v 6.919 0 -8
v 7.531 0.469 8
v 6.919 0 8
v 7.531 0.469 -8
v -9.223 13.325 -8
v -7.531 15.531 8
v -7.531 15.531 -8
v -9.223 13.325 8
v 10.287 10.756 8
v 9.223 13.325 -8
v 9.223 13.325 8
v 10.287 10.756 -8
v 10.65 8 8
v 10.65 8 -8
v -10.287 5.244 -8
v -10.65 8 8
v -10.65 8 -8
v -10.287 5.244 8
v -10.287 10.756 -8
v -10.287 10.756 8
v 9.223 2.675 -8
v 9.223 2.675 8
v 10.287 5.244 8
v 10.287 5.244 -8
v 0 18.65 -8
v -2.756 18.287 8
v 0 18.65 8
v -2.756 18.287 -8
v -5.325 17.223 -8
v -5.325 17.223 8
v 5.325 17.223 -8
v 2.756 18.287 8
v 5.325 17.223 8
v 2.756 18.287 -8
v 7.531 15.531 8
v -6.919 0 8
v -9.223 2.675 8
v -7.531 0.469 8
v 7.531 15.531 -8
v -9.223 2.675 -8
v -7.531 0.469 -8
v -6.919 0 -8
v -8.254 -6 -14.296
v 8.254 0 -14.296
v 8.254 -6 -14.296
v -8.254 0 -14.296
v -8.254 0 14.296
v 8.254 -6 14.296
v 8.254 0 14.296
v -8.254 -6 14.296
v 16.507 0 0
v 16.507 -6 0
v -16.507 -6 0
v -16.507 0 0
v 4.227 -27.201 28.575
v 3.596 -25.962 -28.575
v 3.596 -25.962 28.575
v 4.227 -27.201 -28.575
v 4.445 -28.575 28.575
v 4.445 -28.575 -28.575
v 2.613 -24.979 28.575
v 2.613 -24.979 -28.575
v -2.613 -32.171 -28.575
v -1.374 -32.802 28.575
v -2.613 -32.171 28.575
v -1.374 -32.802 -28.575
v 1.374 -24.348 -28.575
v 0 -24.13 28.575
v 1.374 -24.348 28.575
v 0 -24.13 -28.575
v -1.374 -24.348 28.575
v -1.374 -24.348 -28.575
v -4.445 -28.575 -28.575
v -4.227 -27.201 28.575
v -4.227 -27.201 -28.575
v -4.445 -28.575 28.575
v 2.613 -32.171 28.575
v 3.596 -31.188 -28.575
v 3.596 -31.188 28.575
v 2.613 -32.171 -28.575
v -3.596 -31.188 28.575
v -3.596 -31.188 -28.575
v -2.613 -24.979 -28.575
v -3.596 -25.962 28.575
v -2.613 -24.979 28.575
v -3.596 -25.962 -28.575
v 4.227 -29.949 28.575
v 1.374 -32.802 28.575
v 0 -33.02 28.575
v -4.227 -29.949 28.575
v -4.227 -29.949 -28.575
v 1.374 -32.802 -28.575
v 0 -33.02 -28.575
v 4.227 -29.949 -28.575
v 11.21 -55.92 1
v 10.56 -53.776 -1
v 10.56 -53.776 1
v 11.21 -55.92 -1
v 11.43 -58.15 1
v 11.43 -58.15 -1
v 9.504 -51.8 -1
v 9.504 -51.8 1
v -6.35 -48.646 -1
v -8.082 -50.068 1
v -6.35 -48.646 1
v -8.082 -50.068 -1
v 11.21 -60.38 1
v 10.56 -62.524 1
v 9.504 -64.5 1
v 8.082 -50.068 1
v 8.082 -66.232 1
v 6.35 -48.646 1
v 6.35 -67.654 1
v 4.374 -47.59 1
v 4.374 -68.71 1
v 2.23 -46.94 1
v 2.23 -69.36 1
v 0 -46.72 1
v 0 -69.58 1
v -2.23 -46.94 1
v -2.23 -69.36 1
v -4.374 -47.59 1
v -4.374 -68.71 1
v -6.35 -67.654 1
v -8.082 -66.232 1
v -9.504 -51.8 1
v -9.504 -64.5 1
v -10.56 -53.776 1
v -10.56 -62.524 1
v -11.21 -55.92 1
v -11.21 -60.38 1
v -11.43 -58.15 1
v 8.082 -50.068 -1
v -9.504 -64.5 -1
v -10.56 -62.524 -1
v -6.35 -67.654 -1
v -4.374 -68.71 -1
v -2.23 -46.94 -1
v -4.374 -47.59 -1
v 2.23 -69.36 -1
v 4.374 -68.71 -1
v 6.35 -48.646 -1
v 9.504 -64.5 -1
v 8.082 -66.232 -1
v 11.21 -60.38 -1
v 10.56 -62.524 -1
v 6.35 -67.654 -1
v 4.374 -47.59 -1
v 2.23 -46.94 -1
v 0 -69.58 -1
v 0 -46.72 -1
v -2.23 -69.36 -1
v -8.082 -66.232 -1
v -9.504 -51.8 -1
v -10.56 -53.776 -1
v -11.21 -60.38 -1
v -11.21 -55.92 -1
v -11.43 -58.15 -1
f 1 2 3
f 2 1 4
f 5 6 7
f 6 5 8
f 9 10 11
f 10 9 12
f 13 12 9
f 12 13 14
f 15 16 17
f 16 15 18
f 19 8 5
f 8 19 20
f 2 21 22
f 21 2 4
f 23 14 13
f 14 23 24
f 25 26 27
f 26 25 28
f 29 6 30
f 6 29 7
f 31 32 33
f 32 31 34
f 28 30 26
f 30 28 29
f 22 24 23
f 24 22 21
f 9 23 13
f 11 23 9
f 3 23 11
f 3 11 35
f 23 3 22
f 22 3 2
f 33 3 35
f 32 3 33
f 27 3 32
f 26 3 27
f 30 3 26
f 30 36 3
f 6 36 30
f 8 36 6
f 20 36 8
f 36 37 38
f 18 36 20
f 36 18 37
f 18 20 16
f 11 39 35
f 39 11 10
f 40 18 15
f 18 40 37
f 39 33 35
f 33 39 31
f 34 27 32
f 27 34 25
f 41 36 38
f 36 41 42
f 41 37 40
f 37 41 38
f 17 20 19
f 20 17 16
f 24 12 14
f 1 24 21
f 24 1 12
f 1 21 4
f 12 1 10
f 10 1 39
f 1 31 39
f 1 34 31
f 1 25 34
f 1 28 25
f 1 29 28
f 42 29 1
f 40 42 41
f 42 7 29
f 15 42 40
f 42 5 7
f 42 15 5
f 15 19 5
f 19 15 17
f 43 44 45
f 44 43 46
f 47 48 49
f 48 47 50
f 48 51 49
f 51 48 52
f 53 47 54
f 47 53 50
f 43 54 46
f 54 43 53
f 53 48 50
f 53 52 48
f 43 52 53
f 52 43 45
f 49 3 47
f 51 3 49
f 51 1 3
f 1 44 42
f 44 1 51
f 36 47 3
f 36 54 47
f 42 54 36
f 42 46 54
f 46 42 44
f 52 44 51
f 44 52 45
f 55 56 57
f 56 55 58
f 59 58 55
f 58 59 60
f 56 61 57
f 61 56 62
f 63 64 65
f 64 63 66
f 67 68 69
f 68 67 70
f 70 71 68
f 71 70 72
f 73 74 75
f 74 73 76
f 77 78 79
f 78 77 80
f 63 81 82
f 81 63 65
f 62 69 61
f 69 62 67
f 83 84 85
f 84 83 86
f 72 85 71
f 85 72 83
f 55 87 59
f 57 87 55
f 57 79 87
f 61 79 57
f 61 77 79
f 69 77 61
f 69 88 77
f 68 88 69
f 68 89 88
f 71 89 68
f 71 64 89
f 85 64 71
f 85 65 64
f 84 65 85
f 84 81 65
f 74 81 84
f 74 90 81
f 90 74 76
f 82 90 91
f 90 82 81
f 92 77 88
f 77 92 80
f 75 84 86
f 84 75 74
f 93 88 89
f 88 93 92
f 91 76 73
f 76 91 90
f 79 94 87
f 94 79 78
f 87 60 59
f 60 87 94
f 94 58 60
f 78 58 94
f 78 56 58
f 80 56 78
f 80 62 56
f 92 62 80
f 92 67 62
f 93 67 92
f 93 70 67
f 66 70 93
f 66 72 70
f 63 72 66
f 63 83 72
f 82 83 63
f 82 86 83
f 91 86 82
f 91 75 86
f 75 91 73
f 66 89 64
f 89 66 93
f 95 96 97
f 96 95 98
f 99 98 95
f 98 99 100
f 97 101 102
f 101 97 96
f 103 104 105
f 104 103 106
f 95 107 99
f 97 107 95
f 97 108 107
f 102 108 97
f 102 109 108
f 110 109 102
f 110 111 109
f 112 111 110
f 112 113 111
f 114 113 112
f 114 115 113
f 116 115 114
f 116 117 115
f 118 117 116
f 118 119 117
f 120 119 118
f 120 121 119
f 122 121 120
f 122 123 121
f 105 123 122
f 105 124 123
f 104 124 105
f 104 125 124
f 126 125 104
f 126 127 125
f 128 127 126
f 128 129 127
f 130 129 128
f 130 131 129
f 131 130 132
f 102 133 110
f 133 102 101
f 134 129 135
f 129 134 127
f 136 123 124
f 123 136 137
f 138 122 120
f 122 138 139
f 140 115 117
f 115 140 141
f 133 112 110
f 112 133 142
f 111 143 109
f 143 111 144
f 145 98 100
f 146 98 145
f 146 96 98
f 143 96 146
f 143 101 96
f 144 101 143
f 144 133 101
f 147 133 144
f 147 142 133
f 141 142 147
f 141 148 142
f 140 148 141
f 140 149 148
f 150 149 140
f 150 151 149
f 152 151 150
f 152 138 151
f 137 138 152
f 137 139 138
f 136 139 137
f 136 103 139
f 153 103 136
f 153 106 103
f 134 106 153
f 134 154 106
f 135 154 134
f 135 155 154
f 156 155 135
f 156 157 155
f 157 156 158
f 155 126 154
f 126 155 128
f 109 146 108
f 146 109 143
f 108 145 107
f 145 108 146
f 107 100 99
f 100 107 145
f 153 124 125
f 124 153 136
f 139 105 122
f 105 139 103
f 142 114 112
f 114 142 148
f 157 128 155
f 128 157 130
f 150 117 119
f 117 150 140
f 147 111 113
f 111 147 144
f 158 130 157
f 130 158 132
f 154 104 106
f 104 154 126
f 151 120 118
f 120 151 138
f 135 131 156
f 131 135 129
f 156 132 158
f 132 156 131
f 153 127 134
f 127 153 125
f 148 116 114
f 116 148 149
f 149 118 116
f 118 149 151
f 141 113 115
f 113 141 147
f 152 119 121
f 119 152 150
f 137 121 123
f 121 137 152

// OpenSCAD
// Auto-generated by scripts/author_from_manifest.py (Phase D.3).
// Source: data/phase_d_manifest.json (sku_intent='reliable-f1fr56-qr-pendent-200f').
// Do not hand-edit — regenerate from the manifest.
//
// @part reliable_f1fr56_qr_pendent_200f
// @kind sprinkler_head
// @category head.pendant.k56
// @display-name "Reliable F1FR56 QR Pendent K5.6 200°F"
// @mfg reliable_automatic_sprinkler
// @mfg-pn F1FR56
// @listing UL FM
// @hazard-classes LH OH1
// @price-usd 14.25
// @install-minutes 8
// @crew journeyman
// @k-factor 5.6
// @orientation pendant
// @response quick
// @temperature 200F
// @param size_in number default=0.5 label="Size" unit="in"
// @port inlet position=[0,0.014,0] direction=[0,1,0] style=NPT_threaded size_in=0.5 role=drop

size_in = 0.5;
k_factor = 5.6;

length_mm   = 57.15;
body_dia_mm = 25.40;
thread_od   = 21.3;
thread_len  = 16;
deflector_d = body_dia_mm * 0.9;

 union() {
    translate([0, thread_len/2, 0])
        cylinder(h = thread_len, d = thread_od, center = true, $fn = 24);
    translate([0, -3, 0])
        rotate([90, 0, 0])
        cylinder(h = 6, d = thread_od * 1.55, $fn = 6, center = true);
    translate([0, -length_mm/2, 0])
        cylinder(h = length_mm, d = body_dia_mm * 0.35, center = true, $fn = 20);
    translate([0, -length_mm - 1, 0])
        cylinder(h = 2, d = deflector_d, center = true, $fn = 32);
}
